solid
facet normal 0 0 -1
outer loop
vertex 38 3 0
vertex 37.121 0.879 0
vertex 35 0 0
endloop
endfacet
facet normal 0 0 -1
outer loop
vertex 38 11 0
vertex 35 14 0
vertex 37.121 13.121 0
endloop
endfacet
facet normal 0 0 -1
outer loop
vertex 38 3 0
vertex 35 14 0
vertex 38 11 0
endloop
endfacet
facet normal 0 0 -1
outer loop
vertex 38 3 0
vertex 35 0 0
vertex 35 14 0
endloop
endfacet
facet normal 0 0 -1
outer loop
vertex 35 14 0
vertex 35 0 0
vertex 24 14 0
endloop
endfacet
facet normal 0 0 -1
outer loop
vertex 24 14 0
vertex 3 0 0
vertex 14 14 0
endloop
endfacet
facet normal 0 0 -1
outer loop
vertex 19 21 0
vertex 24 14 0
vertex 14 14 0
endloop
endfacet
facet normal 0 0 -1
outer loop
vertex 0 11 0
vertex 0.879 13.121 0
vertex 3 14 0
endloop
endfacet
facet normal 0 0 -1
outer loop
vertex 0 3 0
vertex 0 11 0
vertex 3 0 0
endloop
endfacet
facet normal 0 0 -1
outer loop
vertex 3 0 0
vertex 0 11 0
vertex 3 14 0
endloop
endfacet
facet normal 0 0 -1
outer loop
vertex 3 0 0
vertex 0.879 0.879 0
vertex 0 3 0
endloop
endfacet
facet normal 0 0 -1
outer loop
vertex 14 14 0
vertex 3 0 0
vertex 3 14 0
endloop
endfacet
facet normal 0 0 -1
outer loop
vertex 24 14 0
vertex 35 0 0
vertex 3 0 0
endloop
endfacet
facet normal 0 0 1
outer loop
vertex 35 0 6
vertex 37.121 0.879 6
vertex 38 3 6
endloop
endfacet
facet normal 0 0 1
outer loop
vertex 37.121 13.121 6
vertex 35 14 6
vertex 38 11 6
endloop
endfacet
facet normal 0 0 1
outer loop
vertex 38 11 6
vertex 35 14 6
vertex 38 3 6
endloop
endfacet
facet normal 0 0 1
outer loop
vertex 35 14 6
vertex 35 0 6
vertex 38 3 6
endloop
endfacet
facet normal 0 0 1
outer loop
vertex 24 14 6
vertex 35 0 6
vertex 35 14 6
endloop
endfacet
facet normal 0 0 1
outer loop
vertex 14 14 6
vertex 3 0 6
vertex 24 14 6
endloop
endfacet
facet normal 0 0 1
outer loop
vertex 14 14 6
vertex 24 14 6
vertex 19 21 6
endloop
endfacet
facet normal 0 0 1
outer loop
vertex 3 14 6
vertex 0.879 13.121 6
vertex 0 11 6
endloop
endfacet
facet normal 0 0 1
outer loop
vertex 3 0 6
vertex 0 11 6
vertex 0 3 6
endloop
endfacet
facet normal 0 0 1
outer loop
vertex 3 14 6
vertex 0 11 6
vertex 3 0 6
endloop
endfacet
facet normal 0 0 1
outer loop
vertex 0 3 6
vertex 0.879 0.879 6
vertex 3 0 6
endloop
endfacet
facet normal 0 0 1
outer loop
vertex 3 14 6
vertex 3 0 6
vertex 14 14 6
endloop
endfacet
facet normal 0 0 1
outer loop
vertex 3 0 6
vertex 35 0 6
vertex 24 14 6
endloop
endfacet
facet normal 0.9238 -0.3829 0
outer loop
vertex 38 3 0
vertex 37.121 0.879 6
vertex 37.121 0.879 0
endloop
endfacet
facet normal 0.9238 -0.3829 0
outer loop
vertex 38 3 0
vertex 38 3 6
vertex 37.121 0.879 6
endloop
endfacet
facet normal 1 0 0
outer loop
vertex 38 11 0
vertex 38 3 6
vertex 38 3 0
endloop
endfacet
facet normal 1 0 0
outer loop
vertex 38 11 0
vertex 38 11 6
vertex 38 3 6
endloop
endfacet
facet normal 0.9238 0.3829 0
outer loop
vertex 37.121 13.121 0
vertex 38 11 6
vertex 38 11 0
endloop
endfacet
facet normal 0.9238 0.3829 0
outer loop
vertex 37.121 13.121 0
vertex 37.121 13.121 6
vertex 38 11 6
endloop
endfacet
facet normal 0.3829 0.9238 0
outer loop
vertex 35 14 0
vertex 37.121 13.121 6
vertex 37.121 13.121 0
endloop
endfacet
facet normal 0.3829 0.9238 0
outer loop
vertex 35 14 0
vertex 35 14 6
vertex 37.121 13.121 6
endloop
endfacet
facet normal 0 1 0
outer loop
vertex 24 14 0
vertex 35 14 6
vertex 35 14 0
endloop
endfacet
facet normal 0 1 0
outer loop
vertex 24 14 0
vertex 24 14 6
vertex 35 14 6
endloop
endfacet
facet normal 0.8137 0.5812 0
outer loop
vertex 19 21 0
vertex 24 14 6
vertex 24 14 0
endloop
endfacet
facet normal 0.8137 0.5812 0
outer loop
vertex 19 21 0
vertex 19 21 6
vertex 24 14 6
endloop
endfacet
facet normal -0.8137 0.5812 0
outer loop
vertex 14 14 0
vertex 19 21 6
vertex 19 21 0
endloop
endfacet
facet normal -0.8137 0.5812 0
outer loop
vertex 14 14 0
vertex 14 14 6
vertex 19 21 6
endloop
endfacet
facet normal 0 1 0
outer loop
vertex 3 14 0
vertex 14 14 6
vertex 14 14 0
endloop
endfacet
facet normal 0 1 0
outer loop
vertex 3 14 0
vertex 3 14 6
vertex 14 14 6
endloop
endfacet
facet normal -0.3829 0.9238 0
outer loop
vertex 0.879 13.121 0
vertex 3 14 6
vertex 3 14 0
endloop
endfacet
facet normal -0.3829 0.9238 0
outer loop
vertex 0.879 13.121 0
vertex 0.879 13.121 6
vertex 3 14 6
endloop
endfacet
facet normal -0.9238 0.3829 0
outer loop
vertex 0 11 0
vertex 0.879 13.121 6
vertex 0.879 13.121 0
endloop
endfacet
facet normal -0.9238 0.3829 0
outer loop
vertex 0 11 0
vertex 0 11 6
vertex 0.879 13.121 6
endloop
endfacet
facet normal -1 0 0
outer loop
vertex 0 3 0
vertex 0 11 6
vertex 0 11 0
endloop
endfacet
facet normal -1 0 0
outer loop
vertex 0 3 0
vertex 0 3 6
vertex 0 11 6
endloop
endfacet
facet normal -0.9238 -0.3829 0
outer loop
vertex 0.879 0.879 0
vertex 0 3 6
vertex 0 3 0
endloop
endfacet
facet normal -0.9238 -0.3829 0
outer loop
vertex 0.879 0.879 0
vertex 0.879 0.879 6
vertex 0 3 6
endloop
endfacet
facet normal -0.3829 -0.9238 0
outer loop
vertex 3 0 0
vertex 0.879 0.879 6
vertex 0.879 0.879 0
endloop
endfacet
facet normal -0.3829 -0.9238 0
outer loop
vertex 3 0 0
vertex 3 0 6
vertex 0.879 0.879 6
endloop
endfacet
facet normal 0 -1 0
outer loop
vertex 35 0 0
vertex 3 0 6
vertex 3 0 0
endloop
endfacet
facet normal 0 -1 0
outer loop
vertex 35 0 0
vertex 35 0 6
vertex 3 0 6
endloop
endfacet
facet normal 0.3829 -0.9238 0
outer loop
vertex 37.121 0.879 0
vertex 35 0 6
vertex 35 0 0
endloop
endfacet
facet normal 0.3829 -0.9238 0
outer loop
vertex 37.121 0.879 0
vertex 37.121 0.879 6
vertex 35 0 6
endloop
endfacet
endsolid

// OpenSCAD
$fn = 32;

// ----------------------------------------------------------------------
// Ratchet pawl: 38 x 14 mm body, beak 7 mm сверху
// ----------------------------------------------------------------------

// --- parameters (mm) ---
profile_height = 6;       // extrusion height
profile_points = 15;      // points of the closed outline

profile = [[0, 3], [0.879, 0.879], [3, 0], [35, 0], [37.121, 0.879], [38, 3], [38, 11], [37.121, 13.121], [35, 14], [24, 14], [19, 21], [14, 14], [3, 14], [0.879, 13.121], [0, 11]];  // single closed polygon, 15 points, counter clockwise

// --- the one profile operation ---
linear_extrude(height = profile_height) polygon(points = profile);
